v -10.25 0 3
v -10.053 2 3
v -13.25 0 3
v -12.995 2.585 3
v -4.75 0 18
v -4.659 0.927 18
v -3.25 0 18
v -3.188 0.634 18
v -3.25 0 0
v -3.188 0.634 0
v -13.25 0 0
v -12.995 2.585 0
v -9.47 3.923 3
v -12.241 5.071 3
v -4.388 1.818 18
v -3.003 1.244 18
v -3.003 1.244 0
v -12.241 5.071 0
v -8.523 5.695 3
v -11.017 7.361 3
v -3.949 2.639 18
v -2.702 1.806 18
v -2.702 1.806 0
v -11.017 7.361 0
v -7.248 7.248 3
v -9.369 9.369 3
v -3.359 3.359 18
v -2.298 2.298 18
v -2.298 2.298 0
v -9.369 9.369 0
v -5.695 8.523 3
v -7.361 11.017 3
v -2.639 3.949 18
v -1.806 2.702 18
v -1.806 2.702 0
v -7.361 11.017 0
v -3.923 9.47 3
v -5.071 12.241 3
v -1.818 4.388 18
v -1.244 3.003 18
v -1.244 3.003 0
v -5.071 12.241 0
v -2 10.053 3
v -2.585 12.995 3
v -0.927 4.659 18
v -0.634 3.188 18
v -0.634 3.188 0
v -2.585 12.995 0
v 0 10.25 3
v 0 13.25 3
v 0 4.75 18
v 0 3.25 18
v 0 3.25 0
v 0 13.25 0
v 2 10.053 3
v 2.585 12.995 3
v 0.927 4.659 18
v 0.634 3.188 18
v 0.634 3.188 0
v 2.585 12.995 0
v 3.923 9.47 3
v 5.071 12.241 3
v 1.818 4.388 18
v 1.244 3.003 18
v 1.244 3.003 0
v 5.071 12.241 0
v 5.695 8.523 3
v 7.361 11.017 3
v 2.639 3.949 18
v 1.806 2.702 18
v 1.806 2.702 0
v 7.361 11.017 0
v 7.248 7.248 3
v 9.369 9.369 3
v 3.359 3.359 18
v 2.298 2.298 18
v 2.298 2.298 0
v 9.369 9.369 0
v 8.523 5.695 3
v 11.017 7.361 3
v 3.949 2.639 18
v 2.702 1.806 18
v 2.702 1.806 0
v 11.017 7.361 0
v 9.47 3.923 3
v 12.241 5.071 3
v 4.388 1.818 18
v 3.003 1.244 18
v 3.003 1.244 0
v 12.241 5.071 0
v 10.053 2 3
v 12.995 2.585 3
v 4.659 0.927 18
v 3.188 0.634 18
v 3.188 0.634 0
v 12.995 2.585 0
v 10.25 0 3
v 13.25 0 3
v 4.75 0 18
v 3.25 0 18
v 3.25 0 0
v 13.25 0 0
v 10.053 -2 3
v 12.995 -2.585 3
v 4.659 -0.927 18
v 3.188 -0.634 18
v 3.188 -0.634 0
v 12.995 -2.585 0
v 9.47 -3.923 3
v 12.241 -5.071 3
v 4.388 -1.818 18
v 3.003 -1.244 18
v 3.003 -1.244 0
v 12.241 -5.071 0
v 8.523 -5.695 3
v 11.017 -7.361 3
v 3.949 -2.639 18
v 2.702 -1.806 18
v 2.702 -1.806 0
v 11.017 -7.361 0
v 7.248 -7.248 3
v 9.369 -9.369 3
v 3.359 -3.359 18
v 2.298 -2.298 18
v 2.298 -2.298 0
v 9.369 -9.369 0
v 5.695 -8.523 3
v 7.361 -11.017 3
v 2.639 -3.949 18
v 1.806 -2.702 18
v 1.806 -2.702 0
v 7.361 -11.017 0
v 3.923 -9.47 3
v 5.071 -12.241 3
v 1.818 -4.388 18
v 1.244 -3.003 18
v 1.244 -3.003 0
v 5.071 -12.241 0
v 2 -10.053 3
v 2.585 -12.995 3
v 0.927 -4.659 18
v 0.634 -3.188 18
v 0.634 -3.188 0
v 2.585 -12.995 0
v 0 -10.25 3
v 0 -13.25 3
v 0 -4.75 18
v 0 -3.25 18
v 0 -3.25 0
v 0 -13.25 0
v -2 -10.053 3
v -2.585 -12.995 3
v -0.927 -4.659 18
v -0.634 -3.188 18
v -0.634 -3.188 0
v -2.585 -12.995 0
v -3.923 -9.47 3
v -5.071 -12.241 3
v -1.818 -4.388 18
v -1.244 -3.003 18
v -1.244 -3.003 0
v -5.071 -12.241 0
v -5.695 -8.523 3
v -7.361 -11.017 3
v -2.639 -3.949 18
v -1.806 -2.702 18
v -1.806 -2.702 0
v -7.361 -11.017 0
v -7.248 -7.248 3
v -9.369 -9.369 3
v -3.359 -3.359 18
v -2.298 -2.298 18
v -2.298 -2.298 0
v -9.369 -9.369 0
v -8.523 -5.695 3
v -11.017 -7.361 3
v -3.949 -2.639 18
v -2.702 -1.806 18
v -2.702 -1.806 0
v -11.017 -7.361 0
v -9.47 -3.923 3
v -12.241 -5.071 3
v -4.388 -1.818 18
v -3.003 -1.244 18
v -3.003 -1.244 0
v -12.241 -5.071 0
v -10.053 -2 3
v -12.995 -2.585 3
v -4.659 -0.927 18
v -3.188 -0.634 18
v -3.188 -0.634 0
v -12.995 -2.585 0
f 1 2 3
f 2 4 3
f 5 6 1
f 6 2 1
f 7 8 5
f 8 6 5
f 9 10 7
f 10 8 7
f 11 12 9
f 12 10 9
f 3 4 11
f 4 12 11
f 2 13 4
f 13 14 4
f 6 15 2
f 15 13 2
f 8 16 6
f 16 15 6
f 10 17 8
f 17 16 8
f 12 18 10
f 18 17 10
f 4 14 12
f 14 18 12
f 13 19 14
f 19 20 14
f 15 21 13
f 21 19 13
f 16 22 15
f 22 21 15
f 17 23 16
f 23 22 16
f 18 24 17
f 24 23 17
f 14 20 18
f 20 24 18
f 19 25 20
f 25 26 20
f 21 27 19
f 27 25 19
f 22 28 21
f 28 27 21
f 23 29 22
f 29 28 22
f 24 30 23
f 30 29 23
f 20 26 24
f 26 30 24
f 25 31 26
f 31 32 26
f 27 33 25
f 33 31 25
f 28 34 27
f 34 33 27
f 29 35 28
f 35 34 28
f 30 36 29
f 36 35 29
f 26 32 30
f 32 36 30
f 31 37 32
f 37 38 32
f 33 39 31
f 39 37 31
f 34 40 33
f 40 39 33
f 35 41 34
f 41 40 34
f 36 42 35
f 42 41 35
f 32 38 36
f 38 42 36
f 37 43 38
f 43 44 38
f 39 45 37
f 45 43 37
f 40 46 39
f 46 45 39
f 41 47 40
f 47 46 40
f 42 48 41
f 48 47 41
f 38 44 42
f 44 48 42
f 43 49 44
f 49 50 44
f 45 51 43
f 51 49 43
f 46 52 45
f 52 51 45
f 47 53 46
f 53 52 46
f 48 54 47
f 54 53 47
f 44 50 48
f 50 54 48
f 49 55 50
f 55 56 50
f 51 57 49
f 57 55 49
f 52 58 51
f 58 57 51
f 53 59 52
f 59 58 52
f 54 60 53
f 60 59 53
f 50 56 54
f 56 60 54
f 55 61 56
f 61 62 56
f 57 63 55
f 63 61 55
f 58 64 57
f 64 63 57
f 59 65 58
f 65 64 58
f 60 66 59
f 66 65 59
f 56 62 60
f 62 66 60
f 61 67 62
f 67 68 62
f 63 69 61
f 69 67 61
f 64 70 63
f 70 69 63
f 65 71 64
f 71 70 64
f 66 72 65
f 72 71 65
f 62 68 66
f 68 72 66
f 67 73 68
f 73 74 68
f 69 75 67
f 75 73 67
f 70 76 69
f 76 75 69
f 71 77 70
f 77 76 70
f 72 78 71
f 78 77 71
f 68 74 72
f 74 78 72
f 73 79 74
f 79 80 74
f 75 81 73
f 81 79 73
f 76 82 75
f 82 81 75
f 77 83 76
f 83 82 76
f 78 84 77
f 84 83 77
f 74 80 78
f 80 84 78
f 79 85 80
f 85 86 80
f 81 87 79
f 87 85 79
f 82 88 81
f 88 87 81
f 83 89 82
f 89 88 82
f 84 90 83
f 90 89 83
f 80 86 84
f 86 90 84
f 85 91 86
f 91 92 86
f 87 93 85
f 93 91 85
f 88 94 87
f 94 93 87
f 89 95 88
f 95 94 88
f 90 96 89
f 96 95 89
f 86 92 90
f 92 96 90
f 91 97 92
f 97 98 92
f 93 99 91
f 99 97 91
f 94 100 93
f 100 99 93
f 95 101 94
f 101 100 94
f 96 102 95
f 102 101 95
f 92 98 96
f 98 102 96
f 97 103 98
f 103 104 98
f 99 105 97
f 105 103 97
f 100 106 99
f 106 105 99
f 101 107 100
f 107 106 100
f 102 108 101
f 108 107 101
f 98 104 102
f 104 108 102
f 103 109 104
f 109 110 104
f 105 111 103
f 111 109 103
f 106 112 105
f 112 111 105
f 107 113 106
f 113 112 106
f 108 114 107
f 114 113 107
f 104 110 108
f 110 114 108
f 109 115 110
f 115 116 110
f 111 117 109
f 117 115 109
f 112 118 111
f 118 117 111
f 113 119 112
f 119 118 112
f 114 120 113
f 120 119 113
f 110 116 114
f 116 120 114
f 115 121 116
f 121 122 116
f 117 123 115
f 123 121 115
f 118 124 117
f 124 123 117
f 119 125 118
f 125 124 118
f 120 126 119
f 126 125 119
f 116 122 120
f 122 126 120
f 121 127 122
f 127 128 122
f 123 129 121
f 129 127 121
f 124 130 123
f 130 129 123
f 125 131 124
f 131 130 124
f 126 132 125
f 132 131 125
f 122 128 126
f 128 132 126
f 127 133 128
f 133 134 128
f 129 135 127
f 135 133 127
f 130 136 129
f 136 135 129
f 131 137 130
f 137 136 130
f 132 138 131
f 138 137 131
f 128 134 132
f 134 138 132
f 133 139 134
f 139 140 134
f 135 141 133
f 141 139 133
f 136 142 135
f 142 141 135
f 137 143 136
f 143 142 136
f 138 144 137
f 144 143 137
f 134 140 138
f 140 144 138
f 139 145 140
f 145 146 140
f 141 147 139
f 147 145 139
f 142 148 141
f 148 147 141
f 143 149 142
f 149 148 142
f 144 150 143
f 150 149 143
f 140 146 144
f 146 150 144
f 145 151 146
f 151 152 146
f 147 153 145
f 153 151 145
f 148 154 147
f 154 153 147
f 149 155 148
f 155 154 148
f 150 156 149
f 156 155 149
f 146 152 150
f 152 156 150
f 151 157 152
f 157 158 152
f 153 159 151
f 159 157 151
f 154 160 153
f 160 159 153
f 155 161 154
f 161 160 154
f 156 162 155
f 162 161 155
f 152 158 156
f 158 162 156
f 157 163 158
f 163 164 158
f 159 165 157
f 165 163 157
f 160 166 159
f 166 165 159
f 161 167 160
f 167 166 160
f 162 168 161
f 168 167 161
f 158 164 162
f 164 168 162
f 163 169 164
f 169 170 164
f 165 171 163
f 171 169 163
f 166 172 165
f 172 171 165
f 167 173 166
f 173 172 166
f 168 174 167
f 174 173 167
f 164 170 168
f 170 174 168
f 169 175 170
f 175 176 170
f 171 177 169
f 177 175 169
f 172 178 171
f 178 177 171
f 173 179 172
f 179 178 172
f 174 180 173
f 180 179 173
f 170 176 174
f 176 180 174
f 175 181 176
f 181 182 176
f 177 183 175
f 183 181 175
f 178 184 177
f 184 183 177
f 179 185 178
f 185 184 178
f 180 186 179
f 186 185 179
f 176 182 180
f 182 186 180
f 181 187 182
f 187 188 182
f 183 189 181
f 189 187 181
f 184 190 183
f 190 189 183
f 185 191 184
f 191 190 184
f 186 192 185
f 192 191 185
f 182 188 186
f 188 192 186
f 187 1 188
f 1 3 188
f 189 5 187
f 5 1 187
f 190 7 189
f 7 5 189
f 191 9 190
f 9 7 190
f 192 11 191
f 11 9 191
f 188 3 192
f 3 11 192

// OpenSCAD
$fn = 32;

// ----------------------------------------------------------------------
// Profiled standoff: conical spacer, 18 mm long, bore 6.5 mm
// ----------------------------------------------------------------------

// --- parameters (mm) ---
revolve_angle = 360;      // full turn around the Z axis
profile_points = 6;       // points of the closed outline

profile = [[3.25, 0], [13.25, 0], [13.25, 3], [10.25, 3], [4.75, 18], [3.25, 18]];  // single closed polygon, 6 points, counter clockwise

// --- the one profile operation ---
rotate_extrude(angle = revolve_angle) polygon(points = profile);
